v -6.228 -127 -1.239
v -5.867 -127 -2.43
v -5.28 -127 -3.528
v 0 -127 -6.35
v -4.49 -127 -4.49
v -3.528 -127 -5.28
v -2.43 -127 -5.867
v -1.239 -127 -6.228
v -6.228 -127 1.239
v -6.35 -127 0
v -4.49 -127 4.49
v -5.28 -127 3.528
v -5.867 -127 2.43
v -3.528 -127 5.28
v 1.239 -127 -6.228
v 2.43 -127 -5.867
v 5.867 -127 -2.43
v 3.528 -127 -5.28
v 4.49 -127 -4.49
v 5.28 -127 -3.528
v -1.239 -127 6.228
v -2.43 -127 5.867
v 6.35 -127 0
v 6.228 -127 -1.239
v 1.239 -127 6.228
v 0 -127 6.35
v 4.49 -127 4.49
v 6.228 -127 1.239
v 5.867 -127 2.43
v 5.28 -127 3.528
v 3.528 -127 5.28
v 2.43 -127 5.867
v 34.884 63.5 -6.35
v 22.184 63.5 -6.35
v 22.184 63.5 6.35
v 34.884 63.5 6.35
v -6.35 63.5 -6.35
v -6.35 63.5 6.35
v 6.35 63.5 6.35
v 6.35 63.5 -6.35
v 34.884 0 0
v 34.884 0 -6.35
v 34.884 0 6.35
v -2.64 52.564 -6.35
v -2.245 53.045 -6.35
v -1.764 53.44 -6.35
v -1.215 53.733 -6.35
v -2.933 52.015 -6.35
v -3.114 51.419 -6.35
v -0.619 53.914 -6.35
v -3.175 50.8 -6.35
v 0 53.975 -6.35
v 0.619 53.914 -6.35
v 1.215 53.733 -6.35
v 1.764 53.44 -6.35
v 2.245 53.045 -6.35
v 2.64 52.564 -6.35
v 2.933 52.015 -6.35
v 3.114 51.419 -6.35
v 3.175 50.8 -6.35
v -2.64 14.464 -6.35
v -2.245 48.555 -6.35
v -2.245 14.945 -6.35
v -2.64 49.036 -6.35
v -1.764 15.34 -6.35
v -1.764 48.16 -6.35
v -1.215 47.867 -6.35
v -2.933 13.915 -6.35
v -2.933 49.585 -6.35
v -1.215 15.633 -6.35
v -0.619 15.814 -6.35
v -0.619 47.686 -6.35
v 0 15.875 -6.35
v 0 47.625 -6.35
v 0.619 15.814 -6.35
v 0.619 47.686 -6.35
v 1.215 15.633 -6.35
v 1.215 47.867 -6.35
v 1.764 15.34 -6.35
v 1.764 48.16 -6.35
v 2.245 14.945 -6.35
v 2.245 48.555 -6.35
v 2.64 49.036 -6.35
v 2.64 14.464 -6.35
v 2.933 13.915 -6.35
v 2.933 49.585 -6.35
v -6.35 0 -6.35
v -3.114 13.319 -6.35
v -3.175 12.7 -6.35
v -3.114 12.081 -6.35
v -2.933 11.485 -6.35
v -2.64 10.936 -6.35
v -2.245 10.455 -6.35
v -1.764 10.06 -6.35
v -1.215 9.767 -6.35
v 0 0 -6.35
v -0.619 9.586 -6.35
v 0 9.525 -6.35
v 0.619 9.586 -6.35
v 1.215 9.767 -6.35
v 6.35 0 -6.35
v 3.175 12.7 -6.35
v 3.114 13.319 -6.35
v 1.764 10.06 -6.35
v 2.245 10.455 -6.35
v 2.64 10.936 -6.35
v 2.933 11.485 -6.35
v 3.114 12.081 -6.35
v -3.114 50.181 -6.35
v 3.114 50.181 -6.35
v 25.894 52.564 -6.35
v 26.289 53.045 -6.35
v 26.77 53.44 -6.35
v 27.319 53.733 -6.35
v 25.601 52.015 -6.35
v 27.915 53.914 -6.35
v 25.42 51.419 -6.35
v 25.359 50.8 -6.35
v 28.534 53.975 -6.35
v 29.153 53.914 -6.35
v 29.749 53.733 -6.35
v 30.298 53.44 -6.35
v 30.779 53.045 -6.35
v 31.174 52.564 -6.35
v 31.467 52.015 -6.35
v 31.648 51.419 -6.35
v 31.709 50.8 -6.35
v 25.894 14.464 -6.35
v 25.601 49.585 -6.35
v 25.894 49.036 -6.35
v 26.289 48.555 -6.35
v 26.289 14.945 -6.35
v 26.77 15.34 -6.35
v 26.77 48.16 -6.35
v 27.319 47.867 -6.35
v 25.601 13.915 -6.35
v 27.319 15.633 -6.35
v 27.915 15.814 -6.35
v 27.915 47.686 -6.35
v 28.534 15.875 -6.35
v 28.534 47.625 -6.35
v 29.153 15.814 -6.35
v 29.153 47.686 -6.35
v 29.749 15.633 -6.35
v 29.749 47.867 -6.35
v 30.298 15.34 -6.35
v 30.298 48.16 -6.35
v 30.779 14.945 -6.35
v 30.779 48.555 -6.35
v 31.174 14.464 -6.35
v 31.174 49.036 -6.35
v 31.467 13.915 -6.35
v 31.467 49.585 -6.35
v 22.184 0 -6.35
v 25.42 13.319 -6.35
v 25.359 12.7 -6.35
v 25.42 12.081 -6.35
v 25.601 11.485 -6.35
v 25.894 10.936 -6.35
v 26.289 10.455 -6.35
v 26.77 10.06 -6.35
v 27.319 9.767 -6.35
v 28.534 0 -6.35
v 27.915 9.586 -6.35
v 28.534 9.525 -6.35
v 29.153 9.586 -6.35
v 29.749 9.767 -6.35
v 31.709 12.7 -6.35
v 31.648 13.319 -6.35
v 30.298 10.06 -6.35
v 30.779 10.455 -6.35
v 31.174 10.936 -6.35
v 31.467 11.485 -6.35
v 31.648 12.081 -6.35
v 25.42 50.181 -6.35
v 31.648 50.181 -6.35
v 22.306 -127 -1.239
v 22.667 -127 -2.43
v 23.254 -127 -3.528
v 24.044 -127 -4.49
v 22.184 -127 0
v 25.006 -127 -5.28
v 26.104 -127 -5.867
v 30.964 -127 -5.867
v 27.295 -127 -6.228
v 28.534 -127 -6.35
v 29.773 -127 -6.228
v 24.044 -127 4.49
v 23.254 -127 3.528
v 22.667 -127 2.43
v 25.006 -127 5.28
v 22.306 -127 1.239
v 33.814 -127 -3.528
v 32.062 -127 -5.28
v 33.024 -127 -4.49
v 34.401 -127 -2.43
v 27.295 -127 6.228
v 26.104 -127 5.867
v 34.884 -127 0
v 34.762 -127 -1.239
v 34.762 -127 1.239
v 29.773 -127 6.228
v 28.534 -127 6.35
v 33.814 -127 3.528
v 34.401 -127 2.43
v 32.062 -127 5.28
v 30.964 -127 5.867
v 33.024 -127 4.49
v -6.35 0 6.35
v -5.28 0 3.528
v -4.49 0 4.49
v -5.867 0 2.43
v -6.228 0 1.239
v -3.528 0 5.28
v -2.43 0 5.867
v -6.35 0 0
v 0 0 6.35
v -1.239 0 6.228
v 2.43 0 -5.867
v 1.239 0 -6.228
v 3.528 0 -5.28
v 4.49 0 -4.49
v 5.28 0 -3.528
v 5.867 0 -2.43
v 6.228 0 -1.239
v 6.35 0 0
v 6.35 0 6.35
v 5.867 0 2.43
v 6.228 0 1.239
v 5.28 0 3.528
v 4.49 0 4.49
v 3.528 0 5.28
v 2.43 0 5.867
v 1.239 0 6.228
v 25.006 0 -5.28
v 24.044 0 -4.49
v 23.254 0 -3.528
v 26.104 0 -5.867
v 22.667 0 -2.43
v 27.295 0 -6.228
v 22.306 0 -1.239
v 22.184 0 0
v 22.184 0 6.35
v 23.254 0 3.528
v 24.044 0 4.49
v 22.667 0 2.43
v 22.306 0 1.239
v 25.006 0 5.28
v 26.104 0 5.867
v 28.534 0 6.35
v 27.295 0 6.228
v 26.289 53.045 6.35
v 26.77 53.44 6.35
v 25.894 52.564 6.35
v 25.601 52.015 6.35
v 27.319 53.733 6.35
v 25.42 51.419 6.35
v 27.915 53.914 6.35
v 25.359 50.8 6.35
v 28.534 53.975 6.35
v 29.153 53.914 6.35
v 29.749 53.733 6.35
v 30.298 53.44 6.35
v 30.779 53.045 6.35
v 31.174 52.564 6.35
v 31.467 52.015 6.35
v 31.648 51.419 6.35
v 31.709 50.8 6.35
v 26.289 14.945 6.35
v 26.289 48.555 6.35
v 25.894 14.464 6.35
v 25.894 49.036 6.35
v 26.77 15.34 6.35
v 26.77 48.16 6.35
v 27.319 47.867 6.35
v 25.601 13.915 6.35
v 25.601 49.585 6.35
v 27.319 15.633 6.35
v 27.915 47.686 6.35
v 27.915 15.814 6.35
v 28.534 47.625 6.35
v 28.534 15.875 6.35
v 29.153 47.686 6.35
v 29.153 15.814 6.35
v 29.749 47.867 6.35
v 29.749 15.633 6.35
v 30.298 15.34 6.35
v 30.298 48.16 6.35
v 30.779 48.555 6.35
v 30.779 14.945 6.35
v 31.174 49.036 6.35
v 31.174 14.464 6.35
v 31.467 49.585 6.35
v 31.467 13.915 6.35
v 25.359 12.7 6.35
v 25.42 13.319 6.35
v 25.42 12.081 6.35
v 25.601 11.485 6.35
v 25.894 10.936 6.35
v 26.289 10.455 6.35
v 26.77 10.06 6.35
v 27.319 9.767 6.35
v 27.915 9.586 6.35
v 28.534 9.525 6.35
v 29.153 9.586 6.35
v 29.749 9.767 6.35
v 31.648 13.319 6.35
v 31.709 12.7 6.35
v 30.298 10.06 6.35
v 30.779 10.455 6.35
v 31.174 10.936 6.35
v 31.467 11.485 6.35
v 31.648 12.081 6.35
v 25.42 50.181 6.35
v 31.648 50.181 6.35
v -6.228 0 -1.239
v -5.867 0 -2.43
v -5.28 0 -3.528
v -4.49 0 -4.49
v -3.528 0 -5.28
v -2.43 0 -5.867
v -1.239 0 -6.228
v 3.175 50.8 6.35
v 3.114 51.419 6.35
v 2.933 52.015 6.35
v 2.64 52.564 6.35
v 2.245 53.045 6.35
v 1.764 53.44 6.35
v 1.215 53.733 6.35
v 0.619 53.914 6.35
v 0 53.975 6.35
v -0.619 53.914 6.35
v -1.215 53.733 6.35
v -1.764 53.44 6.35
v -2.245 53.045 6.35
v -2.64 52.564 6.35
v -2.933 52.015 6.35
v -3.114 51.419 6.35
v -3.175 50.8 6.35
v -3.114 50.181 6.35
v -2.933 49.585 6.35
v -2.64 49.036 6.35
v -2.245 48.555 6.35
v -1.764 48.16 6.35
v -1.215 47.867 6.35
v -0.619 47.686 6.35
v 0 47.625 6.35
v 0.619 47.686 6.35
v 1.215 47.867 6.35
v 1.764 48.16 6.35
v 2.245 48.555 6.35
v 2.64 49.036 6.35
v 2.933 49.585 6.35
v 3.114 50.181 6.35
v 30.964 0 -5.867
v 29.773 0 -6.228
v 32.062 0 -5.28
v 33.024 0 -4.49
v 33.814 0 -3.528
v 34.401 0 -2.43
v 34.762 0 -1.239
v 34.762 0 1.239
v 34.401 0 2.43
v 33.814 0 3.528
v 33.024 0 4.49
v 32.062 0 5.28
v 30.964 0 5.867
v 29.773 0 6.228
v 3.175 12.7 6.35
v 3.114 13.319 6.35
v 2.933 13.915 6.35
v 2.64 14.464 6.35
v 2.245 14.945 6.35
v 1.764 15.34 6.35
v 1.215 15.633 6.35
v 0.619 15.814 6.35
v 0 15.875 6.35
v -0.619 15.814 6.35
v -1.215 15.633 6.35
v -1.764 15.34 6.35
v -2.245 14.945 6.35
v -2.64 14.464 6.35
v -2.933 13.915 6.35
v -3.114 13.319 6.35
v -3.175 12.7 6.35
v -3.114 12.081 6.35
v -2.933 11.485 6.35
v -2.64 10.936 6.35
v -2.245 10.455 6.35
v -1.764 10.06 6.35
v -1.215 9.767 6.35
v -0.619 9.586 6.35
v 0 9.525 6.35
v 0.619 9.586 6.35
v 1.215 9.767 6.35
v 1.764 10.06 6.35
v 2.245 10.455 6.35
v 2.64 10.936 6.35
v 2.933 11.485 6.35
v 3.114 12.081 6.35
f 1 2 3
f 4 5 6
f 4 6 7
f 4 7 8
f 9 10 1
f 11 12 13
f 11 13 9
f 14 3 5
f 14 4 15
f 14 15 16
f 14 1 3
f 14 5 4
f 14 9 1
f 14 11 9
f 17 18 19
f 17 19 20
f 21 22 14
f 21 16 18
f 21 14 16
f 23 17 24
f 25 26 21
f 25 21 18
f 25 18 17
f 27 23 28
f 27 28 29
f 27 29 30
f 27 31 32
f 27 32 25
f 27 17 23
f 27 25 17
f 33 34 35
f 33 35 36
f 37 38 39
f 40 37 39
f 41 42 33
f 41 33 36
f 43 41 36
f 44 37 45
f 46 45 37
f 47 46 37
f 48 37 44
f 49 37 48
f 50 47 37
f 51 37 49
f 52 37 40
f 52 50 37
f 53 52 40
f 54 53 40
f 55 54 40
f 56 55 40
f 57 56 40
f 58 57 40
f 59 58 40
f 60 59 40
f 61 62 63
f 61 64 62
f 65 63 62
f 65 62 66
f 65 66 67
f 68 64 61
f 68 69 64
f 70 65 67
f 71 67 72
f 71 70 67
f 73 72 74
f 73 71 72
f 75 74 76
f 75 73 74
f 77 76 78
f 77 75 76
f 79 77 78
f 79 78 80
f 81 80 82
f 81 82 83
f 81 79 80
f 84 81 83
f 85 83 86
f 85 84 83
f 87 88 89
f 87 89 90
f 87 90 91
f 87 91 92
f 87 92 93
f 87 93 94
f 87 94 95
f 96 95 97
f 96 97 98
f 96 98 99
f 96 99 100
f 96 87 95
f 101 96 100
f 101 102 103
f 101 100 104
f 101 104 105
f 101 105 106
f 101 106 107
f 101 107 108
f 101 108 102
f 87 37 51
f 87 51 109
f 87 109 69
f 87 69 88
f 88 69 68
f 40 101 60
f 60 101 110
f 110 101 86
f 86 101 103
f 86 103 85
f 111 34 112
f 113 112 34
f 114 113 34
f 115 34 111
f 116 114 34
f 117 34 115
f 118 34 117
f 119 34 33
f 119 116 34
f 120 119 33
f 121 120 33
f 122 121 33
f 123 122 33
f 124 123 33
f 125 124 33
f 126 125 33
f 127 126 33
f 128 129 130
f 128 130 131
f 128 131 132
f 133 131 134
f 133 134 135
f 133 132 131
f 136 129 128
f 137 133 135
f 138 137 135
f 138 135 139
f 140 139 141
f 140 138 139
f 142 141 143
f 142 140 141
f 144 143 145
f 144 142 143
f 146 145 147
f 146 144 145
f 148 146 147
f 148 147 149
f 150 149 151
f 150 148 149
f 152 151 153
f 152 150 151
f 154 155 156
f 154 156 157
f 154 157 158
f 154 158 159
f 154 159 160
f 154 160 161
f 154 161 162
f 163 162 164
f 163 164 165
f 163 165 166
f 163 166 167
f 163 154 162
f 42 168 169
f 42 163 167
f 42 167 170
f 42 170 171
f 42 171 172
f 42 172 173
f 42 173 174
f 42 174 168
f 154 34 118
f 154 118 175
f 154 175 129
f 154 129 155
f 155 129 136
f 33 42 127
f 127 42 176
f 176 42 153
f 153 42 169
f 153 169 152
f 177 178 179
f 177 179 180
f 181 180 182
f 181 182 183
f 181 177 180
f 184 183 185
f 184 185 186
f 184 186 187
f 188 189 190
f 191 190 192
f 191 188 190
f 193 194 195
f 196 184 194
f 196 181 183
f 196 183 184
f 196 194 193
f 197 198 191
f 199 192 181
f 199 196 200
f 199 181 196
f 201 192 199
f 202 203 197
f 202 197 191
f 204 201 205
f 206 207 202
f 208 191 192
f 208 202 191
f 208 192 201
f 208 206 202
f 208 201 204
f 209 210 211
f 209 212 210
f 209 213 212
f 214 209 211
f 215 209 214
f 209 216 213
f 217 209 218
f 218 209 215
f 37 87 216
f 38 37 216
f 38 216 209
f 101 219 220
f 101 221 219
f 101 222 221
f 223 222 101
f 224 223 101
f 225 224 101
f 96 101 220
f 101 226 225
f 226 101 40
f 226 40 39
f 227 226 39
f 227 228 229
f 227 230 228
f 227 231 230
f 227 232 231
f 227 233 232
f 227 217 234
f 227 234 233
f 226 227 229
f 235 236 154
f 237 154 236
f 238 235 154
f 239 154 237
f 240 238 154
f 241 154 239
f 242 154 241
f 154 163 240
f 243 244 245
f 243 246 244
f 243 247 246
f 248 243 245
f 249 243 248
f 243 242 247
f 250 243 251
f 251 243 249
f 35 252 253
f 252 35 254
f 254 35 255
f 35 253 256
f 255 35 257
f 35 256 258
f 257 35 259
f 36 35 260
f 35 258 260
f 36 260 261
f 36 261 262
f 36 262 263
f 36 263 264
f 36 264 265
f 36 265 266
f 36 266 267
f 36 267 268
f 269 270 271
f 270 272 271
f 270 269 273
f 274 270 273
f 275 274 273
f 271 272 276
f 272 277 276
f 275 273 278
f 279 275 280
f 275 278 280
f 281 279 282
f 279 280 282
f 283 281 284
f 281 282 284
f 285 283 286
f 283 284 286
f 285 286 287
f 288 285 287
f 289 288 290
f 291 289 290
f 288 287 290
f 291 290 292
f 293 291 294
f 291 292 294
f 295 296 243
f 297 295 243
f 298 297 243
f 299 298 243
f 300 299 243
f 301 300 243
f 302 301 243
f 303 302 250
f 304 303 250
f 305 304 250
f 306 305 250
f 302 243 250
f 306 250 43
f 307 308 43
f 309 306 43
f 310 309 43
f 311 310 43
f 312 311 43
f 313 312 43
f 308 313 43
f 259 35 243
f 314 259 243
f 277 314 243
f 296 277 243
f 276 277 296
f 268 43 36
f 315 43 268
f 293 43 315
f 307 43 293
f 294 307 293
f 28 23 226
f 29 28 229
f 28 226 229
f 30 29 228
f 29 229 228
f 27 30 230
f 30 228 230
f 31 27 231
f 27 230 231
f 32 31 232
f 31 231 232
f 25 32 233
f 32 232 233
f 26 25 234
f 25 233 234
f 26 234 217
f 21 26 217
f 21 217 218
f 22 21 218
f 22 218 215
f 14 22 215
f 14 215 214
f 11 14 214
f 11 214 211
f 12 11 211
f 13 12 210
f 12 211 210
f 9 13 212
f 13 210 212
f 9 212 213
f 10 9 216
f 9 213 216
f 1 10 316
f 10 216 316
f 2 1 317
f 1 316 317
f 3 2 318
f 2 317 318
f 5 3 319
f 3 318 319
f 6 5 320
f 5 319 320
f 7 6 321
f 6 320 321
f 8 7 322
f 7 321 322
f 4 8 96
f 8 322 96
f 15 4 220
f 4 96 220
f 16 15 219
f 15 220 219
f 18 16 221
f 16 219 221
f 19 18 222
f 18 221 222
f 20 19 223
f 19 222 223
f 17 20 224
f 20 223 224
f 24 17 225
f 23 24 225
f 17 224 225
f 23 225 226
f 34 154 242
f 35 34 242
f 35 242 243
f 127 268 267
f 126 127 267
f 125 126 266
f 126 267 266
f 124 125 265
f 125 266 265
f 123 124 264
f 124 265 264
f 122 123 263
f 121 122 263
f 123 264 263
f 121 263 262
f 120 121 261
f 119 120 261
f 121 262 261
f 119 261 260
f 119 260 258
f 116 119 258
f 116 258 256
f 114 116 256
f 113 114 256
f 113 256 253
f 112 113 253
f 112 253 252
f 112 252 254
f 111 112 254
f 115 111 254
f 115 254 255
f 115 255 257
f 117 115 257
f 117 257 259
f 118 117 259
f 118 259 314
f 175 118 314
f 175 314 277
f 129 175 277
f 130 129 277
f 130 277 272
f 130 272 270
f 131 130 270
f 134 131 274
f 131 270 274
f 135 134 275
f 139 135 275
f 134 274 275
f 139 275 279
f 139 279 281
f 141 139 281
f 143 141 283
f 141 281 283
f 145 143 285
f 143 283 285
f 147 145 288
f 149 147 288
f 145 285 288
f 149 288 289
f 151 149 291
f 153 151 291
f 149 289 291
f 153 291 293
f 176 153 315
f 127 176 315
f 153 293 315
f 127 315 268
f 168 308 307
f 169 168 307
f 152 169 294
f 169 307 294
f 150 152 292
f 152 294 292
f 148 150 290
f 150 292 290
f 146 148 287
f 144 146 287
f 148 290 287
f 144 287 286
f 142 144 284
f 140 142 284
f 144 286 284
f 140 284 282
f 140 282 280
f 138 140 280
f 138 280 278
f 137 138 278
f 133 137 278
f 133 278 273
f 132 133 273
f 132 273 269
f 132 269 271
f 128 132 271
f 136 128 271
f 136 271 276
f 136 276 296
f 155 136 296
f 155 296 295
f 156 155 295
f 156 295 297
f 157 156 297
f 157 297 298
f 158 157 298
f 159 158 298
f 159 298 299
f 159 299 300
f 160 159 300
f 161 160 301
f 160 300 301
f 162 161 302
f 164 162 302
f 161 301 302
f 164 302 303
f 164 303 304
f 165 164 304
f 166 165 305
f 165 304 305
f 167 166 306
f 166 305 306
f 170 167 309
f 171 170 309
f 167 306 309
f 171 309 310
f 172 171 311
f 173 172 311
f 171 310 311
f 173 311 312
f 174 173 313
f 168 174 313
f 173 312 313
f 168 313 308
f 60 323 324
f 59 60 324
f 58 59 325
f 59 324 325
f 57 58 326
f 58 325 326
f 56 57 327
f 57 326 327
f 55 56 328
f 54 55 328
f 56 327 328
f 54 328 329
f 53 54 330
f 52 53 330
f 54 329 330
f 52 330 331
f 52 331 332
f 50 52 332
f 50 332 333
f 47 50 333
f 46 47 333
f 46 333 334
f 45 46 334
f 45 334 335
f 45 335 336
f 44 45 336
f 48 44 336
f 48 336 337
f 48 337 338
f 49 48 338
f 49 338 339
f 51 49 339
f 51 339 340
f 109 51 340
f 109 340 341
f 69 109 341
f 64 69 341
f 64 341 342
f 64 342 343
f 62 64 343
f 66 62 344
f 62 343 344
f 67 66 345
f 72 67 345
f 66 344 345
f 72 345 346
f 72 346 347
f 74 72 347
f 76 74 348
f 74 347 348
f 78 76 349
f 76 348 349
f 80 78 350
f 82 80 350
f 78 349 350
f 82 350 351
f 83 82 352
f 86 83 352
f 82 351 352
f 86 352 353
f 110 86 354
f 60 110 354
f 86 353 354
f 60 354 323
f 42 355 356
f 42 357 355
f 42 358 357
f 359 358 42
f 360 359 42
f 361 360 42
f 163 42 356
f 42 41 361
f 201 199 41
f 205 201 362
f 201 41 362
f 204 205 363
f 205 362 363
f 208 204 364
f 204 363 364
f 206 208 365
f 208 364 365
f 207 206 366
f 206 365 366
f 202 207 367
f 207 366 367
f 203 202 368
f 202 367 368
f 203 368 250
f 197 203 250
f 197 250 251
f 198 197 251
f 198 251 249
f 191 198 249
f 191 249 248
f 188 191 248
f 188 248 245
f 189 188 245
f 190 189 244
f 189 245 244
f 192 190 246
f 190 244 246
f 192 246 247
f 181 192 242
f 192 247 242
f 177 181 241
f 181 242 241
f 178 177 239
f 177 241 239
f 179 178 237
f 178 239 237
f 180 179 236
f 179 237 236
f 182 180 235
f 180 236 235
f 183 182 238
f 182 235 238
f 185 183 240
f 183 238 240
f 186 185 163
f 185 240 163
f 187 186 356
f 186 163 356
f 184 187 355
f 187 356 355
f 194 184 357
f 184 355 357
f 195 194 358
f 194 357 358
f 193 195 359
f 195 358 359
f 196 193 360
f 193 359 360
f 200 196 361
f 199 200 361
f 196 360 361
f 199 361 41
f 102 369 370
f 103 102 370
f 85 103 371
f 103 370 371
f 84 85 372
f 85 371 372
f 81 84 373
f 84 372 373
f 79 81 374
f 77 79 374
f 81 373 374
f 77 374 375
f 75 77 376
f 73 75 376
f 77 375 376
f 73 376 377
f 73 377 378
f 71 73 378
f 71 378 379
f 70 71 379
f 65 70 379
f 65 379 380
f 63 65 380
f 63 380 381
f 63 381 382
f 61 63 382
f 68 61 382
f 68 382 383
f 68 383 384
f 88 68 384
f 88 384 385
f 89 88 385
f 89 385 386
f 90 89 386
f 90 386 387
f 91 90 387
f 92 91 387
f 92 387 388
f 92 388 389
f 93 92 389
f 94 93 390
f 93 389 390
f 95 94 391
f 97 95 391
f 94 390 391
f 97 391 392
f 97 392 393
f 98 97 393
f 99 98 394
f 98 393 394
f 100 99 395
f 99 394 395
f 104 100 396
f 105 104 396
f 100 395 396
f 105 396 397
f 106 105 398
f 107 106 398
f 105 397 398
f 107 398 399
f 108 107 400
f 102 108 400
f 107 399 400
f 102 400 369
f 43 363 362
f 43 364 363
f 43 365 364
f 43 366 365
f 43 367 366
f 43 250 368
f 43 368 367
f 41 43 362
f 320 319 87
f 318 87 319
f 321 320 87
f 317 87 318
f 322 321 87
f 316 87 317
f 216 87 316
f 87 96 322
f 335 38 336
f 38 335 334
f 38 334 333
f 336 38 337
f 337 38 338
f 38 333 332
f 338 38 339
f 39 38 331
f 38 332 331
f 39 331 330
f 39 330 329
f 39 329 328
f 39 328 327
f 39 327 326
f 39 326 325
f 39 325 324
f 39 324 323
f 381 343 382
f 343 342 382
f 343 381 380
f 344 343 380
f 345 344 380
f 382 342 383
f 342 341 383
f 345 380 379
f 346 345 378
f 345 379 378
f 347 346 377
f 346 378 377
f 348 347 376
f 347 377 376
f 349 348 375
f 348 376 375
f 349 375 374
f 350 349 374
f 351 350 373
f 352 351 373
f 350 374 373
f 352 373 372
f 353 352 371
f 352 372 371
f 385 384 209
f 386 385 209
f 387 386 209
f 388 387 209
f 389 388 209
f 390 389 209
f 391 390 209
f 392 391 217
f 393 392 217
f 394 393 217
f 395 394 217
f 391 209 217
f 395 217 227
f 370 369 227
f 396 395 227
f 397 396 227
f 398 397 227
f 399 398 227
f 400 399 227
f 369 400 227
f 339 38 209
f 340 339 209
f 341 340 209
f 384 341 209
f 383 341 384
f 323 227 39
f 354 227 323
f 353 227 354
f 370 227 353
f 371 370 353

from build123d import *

# Parameters (mm, degrees)
F0_R      = 6.35
F1_DEPTH  = 127
F2_W      = 12.7
F2_H      = 12.7
F3_DEPTH  = 63.5
F4_R      = 3.175
F5_DEPTH  = 254
F6_R      = 6.35
F7_DEPTH  = 127
F8_W      = 12.7
F8_H      = 12.7
F9_DEPTH  = 63.5
F10_R     = 3.175
F11_DEPTH = 254


with BuildPart() as f1:
    # F0 (on Front) → F1 (new body)
    with BuildSketch(Plane.XZ):
        Circle(F0_R)
    extrude(amount=F1_DEPTH)

    # F2 (on Front) → F3 (join)
    with BuildSketch(Plane.XZ):
        Rectangle(F2_W, F2_H)
    extrude(amount=-F3_DEPTH)

    # F4 (on face) → F5 (cut)
    with BuildSketch(Plane.XY.offset(6.35)):
        with Locations((0, 12.7)):
            Circle(F4_R)
        with Locations((0, 50.8)):
            Circle(F4_R)
    extrude(amount=-F5_DEPTH, mode=Mode.SUBTRACT)


with BuildPart() as f7:
    # F6 (on Front) → F7 (new body)
    with BuildSketch(Plane.XZ):
        with Locations((28.534053, 0)):
            Circle(F6_R)
    extrude(amount=F7_DEPTH)

    # F8 (on Front) → F9 (join)
    with BuildSketch(Plane.XZ):
        with Locations((28.534053, 0)):
            Rectangle(F8_W, F8_H)
    extrude(amount=-F9_DEPTH)

    # F10 (on face) → F11 (cut)
    with BuildSketch(Plane.XY.offset(6.35)):
        with Locations((28.534053, 50.8)):
            Circle(F10_R)
        with Locations((28.534053, 12.7)):
            Circle(F10_R)
    extrude(amount=-F11_DEPTH, mode=Mode.SUBTRACT)


solid = Compound([f1.part, f7.part])
